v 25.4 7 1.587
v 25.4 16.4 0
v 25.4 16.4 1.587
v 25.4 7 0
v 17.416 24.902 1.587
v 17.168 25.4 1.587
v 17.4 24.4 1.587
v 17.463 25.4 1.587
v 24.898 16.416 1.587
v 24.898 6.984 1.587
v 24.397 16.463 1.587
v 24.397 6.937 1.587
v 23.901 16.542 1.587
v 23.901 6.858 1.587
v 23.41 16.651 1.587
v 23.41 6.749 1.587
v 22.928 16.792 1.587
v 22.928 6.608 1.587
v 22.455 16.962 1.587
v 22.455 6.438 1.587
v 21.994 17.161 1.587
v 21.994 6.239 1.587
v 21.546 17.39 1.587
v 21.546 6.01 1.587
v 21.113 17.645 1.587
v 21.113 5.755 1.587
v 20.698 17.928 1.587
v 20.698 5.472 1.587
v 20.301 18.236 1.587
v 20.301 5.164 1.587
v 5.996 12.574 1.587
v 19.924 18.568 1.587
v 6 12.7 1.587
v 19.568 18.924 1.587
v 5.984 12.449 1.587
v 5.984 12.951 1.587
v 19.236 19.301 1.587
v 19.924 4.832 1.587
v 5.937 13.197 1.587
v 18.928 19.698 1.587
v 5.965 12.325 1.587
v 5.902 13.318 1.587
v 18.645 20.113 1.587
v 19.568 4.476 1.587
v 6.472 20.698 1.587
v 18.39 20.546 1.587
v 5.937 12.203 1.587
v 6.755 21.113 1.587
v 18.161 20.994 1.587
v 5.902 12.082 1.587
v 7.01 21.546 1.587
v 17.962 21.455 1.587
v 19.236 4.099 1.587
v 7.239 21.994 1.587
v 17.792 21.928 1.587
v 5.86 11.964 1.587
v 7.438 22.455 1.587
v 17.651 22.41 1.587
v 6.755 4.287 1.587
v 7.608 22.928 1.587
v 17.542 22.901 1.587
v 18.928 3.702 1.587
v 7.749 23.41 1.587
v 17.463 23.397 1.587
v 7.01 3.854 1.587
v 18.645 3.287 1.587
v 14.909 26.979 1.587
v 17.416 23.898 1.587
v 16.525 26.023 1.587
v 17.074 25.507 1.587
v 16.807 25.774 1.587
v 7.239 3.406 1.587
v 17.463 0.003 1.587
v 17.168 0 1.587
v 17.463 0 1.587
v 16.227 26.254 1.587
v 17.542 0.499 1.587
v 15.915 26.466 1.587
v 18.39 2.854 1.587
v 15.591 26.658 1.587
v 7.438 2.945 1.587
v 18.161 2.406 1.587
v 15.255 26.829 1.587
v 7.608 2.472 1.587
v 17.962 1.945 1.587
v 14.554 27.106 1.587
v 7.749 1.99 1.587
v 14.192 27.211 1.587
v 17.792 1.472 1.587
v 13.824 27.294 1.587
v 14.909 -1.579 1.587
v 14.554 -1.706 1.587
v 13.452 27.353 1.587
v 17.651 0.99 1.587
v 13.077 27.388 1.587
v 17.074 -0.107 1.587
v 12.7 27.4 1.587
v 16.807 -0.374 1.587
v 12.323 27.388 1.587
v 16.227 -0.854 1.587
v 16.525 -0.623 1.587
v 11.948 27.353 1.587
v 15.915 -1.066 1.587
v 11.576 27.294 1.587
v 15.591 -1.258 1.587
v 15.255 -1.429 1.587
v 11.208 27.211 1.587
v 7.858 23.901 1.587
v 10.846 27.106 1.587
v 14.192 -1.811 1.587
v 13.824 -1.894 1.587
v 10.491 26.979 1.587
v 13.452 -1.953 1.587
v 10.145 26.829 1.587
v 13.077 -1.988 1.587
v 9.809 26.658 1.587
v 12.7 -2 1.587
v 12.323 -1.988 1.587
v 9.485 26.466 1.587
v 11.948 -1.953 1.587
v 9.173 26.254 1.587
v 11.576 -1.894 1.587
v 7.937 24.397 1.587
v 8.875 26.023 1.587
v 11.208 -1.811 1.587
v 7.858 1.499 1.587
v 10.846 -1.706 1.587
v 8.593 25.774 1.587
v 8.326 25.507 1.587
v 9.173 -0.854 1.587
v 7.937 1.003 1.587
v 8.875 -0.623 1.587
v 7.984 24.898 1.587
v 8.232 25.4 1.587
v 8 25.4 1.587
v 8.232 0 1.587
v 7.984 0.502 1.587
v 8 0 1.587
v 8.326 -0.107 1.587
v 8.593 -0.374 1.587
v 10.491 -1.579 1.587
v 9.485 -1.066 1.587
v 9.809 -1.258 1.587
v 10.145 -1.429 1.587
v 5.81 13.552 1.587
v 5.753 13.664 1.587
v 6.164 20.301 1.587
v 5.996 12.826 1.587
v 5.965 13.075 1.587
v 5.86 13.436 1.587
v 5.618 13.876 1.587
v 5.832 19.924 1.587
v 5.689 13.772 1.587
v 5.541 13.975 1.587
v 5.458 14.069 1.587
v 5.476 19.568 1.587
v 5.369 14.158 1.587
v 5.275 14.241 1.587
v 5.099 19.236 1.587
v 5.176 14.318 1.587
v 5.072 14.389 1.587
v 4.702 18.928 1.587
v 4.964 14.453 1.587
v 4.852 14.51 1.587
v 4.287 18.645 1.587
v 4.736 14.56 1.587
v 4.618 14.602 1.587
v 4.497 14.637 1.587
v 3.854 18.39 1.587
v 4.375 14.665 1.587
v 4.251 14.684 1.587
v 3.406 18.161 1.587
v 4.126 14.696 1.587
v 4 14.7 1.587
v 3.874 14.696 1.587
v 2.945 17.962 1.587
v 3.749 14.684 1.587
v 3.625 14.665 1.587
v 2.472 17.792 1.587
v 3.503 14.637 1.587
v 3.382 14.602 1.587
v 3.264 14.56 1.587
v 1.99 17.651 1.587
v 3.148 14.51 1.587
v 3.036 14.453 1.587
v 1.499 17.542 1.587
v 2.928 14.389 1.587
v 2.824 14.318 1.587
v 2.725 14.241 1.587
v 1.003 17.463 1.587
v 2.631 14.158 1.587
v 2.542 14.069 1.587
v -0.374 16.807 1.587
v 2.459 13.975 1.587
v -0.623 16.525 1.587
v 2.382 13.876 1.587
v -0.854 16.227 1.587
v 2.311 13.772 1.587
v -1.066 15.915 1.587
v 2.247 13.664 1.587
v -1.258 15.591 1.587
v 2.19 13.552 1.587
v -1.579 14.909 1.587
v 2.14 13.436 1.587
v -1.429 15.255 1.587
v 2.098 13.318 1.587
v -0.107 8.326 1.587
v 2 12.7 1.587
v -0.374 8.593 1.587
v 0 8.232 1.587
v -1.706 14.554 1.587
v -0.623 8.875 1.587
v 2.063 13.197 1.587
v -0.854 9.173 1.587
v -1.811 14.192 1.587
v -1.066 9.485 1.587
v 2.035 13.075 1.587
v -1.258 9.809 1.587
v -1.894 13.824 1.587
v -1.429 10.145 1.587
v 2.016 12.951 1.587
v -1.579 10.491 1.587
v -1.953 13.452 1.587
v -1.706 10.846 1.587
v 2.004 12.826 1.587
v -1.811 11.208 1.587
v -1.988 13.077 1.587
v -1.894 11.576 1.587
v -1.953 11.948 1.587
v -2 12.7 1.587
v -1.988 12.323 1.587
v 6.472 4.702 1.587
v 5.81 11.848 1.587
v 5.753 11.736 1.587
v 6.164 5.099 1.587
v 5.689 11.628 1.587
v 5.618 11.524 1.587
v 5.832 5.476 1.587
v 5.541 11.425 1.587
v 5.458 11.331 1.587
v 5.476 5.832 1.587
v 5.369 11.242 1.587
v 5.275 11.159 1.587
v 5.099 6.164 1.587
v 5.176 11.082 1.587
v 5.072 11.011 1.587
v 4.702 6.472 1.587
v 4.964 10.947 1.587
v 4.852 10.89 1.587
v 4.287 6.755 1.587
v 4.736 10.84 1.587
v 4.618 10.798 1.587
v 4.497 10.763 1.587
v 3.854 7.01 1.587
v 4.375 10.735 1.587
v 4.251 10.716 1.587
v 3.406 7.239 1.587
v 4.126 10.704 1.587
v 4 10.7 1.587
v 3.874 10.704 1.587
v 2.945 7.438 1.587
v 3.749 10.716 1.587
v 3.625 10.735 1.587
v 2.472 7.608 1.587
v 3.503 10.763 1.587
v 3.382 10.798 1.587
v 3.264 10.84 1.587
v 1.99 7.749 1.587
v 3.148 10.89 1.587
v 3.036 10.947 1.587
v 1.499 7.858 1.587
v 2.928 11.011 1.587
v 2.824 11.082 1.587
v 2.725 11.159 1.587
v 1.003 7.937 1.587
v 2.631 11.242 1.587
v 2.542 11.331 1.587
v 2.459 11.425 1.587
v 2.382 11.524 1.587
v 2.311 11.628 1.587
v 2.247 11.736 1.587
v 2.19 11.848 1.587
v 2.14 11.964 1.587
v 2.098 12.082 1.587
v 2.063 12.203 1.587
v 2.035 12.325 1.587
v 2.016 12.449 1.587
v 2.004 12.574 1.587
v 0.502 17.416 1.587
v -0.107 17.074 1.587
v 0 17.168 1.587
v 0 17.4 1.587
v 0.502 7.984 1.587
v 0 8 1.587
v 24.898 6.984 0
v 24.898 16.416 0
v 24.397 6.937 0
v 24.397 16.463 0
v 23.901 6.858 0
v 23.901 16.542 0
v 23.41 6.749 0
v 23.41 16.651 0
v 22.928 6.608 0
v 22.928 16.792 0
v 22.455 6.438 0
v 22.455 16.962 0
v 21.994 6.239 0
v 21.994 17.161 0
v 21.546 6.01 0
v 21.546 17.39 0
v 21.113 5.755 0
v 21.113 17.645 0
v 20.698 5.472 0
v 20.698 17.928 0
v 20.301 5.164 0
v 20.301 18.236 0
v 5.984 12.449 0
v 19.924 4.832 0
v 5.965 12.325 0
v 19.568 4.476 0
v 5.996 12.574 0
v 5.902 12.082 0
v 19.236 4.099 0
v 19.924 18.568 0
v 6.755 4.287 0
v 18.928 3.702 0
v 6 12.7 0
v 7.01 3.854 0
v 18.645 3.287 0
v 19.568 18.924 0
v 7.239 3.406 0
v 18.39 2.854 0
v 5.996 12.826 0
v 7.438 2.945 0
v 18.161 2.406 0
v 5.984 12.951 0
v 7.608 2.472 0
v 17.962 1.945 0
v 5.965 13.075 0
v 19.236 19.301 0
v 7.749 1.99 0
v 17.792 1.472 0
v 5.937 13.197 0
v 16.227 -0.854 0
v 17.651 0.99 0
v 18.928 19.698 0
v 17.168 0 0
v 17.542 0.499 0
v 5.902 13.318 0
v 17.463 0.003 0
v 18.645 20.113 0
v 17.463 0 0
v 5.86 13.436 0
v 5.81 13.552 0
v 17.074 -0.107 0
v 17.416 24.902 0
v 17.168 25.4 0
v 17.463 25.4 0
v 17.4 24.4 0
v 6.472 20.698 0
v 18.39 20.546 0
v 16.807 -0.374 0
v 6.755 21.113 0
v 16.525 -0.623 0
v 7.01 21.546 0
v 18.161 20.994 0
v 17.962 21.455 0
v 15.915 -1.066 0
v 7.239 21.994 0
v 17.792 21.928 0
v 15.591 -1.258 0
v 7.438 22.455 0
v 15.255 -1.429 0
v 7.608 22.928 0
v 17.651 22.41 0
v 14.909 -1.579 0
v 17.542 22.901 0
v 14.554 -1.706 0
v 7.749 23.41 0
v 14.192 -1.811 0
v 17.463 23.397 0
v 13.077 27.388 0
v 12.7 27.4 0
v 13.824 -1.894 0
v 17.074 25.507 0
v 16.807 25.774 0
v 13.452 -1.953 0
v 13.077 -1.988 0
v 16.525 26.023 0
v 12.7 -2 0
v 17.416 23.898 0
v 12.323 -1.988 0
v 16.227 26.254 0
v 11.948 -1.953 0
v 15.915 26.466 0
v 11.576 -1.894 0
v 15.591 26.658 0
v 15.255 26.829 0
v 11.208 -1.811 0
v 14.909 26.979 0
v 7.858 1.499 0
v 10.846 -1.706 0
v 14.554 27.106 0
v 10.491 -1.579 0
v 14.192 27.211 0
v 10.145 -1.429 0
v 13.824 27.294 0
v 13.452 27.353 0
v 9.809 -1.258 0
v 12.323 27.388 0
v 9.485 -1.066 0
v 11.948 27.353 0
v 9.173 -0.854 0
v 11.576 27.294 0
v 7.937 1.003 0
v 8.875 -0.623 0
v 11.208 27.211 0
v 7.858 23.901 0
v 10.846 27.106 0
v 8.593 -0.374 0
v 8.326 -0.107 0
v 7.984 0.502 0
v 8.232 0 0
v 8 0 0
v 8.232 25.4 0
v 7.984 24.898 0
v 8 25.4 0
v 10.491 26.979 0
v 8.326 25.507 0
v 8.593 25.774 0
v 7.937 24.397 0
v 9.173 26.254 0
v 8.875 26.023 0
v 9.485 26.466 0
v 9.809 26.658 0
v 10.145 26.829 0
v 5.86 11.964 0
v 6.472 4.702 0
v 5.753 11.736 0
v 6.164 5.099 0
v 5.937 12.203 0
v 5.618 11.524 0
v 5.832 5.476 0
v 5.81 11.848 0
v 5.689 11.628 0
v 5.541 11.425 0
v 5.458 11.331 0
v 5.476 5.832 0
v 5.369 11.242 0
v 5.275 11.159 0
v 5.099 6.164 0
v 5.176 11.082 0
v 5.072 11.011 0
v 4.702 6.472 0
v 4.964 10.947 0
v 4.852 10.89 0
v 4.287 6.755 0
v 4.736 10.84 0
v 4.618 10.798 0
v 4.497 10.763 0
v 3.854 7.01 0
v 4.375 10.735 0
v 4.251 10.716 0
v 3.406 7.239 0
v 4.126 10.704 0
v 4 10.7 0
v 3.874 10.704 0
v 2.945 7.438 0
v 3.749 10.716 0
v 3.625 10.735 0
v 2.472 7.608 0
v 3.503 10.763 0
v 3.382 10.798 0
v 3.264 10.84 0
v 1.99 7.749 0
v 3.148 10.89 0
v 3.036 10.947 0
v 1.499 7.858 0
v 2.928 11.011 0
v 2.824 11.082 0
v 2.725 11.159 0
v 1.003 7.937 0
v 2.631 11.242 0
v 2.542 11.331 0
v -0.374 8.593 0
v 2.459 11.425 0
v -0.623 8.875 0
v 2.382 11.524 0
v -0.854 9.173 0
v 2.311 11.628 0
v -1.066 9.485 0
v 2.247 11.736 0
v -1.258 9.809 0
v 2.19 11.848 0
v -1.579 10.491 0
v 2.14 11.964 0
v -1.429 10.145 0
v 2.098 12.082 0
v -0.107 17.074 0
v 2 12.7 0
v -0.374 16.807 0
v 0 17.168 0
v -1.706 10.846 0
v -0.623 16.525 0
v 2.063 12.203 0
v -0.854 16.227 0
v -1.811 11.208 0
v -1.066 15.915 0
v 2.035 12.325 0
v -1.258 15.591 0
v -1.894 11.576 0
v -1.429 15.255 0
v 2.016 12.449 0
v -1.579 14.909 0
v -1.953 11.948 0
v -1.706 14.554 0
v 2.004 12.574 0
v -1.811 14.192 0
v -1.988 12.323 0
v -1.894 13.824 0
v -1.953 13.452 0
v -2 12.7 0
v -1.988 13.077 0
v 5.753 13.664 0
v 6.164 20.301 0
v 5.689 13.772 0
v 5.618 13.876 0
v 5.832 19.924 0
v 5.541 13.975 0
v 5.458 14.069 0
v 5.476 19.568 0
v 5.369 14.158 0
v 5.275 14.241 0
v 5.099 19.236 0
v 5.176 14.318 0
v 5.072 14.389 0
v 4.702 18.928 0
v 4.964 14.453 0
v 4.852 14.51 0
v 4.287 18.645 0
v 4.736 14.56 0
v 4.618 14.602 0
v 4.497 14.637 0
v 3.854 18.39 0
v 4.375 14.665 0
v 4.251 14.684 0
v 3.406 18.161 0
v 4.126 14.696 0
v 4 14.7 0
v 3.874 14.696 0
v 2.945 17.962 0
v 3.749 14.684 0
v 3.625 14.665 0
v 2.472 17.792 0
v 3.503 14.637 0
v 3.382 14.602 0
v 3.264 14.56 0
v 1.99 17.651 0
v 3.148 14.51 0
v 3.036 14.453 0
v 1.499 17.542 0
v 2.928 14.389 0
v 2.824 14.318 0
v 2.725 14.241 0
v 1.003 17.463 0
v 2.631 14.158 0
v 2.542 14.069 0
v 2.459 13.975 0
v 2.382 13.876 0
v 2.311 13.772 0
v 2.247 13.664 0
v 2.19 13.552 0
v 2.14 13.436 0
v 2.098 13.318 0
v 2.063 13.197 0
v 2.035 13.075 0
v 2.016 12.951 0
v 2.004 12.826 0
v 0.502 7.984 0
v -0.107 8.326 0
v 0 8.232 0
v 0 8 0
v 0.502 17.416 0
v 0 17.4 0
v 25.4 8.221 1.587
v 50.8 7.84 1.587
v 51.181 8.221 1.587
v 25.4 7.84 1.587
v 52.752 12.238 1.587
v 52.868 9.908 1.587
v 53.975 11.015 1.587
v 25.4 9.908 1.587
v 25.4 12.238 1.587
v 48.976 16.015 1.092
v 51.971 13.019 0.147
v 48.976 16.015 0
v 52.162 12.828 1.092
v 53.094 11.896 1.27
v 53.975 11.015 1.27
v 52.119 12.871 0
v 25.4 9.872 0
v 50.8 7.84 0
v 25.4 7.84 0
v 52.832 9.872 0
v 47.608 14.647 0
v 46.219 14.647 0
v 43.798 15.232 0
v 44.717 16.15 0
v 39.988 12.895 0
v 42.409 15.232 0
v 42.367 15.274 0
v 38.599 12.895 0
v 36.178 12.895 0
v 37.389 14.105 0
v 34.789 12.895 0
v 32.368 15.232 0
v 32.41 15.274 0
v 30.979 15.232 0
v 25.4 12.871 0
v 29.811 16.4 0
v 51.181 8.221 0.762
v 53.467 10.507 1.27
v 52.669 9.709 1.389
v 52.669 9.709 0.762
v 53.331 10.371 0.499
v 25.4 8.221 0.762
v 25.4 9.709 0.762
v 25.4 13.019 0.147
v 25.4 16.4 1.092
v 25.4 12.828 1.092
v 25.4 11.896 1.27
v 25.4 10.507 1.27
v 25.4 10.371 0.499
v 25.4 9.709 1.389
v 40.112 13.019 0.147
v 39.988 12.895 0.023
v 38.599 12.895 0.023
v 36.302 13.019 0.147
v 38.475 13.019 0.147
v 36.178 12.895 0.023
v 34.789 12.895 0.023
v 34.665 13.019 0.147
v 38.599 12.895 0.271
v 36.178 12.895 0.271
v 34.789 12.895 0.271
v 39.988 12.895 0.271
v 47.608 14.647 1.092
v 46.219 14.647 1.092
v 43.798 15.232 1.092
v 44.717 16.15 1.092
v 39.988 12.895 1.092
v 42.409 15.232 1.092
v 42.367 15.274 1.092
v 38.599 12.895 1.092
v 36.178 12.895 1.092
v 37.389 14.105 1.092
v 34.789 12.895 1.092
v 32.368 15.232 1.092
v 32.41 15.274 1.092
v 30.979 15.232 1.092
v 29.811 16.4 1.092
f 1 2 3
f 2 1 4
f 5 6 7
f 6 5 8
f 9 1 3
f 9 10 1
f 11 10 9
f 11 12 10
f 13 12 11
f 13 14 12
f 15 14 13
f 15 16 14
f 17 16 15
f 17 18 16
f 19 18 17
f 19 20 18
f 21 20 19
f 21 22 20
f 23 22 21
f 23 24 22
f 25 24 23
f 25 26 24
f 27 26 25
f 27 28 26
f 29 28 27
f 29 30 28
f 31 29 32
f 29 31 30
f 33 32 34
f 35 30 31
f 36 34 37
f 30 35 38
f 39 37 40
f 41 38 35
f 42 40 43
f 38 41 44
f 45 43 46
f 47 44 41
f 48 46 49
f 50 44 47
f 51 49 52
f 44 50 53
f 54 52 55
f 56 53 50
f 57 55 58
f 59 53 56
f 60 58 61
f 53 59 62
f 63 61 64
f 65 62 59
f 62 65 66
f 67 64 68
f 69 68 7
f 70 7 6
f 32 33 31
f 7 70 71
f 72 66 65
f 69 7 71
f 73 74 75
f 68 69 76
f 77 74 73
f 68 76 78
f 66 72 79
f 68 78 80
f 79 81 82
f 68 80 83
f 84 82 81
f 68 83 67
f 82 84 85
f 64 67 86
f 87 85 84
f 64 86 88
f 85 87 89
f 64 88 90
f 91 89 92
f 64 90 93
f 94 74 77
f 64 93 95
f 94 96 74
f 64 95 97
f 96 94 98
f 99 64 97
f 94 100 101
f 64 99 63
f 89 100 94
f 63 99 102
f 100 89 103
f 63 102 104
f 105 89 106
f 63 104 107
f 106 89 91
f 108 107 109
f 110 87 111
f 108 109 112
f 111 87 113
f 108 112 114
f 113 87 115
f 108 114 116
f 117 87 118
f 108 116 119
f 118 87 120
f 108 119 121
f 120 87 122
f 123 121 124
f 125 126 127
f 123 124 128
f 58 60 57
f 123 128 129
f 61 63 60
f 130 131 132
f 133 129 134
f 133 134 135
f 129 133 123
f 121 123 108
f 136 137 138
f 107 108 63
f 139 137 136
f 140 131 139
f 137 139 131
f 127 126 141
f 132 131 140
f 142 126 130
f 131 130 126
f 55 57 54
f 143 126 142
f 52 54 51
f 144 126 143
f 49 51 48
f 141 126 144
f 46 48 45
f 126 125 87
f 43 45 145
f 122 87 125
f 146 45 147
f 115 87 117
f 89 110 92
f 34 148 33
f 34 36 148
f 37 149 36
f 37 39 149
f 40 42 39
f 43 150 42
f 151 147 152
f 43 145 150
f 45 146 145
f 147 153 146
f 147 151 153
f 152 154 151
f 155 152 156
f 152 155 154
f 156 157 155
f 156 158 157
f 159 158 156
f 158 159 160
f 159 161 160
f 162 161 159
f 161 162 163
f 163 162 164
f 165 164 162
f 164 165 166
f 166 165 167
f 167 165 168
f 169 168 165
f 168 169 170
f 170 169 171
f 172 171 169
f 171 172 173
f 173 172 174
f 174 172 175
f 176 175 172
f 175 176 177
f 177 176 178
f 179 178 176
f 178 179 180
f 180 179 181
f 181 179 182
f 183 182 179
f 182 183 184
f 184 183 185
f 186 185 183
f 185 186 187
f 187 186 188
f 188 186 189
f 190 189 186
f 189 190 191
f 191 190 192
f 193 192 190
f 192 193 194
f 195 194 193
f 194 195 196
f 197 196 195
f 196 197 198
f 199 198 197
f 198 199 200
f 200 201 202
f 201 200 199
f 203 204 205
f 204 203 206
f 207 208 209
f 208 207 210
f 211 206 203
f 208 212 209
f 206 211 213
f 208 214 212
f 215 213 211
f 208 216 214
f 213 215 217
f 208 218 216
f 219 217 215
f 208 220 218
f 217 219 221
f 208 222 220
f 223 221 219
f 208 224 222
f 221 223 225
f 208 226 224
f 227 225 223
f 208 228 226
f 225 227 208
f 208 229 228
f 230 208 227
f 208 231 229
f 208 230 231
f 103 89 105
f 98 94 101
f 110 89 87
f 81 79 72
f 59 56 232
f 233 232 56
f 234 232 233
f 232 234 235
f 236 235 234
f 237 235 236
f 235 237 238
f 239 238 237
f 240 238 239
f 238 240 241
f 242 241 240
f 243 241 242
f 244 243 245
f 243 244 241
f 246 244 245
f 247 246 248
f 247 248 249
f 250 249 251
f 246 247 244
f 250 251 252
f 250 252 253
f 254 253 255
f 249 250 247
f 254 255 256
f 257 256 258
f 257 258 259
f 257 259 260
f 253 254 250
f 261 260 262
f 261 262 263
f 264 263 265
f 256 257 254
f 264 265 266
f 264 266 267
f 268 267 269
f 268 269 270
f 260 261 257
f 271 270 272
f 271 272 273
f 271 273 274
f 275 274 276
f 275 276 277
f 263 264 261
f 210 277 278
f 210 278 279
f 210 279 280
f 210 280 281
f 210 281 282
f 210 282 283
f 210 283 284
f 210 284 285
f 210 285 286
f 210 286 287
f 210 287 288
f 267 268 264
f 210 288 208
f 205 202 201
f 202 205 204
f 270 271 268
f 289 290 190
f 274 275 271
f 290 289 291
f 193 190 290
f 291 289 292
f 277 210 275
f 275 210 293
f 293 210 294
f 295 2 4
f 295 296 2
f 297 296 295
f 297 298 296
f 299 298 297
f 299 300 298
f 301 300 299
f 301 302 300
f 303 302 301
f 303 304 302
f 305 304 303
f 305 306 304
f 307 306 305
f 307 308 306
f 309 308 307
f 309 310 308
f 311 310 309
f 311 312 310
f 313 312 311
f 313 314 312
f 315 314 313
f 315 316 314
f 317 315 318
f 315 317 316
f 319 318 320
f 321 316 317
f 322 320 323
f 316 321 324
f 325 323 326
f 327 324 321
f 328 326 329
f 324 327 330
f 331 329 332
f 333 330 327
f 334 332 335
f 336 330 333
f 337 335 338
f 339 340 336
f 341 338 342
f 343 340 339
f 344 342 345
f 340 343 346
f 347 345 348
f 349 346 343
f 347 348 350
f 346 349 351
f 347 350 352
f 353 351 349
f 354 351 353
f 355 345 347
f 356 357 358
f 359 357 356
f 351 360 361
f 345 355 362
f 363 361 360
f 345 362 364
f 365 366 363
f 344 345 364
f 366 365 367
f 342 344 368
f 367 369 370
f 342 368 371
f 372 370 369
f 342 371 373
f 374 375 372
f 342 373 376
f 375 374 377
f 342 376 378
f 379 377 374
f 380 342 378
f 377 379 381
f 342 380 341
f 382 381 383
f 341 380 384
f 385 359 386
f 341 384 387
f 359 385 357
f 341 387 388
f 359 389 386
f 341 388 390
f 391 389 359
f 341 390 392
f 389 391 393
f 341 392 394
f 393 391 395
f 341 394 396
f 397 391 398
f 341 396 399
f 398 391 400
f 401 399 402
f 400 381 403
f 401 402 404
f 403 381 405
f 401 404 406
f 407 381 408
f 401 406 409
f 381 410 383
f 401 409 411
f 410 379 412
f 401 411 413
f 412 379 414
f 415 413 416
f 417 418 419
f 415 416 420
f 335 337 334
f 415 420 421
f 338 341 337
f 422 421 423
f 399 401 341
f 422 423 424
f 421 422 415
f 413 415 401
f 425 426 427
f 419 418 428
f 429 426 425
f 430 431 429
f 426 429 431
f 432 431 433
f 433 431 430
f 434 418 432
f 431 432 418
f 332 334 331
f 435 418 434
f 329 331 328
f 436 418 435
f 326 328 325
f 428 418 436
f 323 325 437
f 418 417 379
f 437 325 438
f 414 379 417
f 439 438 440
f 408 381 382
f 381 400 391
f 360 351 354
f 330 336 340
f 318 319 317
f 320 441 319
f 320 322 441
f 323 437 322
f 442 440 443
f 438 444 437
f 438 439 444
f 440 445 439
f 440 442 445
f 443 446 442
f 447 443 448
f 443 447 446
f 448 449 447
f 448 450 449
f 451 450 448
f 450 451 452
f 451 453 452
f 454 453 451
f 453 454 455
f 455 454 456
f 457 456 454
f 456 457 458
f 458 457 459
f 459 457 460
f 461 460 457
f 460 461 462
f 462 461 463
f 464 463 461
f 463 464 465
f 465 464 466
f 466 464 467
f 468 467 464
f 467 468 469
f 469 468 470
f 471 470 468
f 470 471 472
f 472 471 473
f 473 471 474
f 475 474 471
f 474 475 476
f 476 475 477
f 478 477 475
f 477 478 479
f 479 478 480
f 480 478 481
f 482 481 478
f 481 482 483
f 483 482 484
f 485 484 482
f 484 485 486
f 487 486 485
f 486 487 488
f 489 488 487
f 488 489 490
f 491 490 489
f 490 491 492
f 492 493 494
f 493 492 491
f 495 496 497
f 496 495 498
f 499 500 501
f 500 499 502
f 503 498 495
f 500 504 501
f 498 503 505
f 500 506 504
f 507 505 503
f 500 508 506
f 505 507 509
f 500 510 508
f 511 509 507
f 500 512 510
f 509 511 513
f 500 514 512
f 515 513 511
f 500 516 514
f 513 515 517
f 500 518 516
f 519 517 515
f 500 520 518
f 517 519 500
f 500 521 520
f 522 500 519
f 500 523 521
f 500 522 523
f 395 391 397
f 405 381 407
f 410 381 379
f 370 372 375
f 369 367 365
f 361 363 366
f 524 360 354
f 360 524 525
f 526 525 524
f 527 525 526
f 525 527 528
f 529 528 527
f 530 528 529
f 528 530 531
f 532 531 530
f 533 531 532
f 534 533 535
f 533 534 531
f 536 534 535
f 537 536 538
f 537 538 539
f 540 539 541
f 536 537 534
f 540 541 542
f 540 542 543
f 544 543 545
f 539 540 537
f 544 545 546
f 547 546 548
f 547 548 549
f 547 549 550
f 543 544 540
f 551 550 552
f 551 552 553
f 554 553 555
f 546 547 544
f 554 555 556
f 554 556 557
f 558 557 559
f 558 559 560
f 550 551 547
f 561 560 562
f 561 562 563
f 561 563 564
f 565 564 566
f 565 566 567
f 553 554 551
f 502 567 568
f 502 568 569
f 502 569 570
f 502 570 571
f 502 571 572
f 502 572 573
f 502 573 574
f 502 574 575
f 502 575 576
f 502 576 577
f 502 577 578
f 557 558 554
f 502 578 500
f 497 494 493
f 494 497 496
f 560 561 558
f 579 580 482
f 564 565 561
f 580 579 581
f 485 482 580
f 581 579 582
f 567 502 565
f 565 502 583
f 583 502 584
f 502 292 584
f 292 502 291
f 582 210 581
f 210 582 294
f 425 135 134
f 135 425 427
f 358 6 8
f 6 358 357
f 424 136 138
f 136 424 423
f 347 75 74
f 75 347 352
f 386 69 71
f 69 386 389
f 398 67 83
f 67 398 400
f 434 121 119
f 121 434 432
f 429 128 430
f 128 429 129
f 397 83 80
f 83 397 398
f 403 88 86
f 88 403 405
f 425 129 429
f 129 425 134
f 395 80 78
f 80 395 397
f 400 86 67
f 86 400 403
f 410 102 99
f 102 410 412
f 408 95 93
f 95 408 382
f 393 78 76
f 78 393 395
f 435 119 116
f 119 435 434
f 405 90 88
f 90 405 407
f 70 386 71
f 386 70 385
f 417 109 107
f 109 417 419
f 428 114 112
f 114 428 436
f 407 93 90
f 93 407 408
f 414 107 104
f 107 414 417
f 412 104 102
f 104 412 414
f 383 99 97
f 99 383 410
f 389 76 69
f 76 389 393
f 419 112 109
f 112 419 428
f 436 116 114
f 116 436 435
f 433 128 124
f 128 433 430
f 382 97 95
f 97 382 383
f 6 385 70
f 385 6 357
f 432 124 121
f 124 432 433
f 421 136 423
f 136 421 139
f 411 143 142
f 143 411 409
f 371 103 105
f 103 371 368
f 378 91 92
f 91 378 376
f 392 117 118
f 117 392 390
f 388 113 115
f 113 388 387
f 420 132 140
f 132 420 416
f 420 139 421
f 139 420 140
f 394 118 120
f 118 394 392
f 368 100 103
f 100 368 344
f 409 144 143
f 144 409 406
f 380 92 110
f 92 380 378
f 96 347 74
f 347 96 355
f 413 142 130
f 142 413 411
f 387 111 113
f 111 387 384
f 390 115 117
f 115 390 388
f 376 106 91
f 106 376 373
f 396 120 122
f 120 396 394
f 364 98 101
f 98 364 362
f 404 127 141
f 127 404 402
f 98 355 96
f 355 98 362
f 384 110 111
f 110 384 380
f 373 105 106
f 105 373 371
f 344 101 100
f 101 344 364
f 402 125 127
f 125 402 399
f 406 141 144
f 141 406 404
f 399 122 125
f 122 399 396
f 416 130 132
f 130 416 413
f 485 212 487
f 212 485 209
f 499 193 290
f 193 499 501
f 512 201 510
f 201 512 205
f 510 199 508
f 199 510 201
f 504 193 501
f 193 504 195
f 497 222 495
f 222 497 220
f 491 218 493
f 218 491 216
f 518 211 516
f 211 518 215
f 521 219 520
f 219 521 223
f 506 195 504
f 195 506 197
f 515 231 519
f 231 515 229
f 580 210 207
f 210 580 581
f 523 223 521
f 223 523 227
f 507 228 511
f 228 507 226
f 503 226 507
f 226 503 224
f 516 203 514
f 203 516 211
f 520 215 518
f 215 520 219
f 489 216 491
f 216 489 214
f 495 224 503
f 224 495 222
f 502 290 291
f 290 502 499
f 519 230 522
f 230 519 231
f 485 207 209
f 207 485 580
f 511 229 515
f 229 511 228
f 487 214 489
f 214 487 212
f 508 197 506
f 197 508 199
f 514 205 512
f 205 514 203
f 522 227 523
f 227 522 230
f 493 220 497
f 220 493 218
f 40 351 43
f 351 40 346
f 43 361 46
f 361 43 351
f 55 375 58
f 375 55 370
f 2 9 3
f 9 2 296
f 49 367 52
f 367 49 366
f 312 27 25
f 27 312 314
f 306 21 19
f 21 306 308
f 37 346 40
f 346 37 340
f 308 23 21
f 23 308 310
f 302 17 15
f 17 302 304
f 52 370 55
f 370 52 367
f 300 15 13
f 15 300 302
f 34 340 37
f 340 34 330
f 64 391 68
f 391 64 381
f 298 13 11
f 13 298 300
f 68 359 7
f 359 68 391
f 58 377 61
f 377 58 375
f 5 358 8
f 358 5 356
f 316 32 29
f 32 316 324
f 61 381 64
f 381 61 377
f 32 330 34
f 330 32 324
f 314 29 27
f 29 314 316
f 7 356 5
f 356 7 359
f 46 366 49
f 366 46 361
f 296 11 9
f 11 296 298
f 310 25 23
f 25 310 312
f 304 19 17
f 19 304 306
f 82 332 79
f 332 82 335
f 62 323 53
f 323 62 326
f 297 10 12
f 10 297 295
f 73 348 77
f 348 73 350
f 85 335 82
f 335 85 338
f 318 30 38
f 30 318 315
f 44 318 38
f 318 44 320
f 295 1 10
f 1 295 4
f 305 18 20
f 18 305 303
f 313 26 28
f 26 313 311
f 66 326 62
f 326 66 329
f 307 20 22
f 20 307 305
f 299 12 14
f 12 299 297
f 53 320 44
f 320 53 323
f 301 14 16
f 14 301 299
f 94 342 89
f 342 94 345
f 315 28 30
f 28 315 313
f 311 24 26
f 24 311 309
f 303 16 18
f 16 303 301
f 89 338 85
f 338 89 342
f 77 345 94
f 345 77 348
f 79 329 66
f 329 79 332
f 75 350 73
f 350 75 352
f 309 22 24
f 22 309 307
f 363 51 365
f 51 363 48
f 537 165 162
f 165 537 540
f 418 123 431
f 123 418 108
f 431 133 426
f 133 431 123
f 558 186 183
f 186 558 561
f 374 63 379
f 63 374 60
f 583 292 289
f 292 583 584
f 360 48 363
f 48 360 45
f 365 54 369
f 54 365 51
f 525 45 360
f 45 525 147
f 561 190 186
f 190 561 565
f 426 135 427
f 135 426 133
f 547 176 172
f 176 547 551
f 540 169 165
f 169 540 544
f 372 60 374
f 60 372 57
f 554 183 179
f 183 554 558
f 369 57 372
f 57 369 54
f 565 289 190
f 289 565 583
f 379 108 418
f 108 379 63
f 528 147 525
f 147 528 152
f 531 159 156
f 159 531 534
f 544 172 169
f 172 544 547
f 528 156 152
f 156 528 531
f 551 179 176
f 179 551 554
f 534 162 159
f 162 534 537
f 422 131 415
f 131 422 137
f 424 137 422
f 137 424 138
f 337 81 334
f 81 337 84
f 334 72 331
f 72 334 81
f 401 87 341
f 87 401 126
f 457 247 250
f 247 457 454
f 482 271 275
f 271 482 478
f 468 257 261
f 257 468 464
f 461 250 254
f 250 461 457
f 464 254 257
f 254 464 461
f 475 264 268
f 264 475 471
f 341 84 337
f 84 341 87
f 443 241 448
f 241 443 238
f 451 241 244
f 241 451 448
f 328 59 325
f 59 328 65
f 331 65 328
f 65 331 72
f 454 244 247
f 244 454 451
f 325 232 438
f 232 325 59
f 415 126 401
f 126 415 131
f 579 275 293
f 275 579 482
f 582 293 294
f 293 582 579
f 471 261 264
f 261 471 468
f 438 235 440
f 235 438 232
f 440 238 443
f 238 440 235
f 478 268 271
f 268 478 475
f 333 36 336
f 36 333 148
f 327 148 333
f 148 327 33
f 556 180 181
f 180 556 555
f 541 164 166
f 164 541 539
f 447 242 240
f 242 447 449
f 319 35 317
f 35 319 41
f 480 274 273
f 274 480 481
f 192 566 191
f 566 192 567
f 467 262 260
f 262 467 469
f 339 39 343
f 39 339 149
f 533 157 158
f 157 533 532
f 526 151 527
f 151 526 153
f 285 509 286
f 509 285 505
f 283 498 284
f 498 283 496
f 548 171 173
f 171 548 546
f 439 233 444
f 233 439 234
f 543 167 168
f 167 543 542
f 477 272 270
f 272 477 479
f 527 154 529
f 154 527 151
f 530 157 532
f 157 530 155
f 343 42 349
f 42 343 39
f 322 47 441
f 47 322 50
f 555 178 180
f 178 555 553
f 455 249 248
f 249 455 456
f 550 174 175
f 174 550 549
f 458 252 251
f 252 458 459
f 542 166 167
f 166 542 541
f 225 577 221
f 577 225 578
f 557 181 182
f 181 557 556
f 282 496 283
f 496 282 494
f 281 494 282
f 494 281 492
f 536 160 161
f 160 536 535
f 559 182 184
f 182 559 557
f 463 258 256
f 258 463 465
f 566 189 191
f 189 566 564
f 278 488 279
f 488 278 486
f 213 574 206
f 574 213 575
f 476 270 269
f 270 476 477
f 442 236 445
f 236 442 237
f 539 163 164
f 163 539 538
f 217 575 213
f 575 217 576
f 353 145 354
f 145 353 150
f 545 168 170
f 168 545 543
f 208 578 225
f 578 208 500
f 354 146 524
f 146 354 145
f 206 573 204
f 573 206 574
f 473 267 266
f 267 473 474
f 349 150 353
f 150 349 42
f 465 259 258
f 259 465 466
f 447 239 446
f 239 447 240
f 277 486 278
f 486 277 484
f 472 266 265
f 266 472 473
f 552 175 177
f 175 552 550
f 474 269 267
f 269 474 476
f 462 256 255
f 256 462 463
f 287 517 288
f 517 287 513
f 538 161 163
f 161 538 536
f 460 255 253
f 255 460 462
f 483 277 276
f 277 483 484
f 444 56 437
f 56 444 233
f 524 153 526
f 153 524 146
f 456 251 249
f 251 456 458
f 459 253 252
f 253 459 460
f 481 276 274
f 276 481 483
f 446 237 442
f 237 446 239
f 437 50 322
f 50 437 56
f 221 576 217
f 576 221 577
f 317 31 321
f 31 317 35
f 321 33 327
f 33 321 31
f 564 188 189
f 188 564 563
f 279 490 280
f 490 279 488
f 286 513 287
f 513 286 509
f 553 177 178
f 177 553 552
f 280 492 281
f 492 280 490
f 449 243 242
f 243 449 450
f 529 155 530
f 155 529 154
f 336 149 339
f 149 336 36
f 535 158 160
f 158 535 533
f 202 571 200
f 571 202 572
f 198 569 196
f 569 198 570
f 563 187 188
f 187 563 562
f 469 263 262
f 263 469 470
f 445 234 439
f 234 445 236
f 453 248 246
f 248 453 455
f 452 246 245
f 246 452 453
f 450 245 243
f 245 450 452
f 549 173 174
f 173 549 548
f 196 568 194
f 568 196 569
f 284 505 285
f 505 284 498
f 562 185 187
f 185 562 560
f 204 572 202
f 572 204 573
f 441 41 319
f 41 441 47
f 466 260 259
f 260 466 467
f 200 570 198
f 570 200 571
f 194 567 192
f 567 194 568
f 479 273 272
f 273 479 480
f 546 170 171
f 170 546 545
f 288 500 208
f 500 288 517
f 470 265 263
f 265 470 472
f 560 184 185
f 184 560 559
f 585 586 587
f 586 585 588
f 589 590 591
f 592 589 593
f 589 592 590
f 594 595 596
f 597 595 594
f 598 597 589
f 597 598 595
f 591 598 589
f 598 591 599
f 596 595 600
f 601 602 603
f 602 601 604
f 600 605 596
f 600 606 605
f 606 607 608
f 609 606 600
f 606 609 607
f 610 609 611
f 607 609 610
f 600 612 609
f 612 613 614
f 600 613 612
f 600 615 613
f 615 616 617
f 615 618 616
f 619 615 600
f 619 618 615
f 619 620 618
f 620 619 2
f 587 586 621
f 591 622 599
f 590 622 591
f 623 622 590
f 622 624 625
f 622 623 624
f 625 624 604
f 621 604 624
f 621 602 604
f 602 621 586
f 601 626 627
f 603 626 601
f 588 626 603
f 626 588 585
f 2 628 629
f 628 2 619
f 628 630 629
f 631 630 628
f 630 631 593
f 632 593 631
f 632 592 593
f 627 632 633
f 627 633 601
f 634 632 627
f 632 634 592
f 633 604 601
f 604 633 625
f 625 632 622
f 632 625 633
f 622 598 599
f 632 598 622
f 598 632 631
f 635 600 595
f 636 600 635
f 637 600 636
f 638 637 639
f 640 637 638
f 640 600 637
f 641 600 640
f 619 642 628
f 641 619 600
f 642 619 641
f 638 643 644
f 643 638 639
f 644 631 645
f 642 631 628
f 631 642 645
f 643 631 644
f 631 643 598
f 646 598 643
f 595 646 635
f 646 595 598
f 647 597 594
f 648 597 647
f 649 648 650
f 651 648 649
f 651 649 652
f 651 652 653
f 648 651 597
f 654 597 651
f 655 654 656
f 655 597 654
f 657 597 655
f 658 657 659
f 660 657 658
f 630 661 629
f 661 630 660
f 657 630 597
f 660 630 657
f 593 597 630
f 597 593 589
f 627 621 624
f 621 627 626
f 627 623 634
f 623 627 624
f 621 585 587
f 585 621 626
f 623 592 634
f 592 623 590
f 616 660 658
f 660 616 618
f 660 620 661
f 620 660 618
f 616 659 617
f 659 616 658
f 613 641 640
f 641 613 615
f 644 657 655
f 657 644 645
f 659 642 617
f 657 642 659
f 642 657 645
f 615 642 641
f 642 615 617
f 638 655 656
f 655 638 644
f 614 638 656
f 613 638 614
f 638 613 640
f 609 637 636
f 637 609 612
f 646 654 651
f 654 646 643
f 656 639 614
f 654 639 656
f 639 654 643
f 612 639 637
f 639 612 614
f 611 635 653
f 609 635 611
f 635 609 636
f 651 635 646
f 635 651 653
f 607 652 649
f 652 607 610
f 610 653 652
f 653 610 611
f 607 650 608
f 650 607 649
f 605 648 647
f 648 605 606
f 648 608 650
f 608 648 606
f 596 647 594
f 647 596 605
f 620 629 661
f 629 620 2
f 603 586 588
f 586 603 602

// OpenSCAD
// github.com/ewust/keys
// but done by baburgess looks like

$fn=100;

function mm(i) = i*25.4;

module bow(bow_length, bow_width, bow_thickness)
{
	difference()
		{
				union()
						{
									cube([bow_length, bow_width, bow_thickness]);

											  	     //Place cylinders on the top and bottom of the bow for style

												     	     	       //Top middle
																	translate([bow_length / 2, bow_width - 4, 0]) cylinder(h = bow_thickness, r = 6);

																			      	//Bottom middle
																							translate([bow_length / 2, 4, 0]) cylinder(h = bow_thickness, r = 6);

																									      	//Left
																													translate([4, bow_width / 2, 0]) cylinder(h = bow_thickness, r = 6);
																														      		}

																																	//Place cylinders around the edges to create a more contoured design

																																		//Right top
																																				translate([bow_length, bow_width - 1, 0]) cylinder(h = bow_thickness, r = 8);

																																						       //Right bottom
																																								//Positioned -1 from the axis to create a bow stop
																																									     	translate([bow_length, -1 , 0]) cylinder(h = bow_thickness, r = 8);

																																												       //Left top
																																														translate([0, bow_width, 0]) cylinder(h = bow_thickness, r = 8);

																																															      //Left bottom
																																																	translate([0, 0, 0]) cylinder(h = bow_thickness, r = 8);

																																																		      //Place hole for keychain use
																																																		      	      	   translate([4, bow_width / 2, 0]) cylinder(h = bow_thickness, r = 2);
																																																				   		 }
																																																						 }

module bit()
{
	w = mm(1/4);
	  difference()
		{
				translate([-w/2, 0, 0]) cube([w, mm(1), w]);
						    translate([-mm(7/256), 0, 0]) rotate([0, 0, 135]) cube([w, w, w]);
						    			      translate([mm(7/256), 0, 0]) rotate([0, 0, -45]) cube([w, w, w]);
									      			    }
												    }

module blade(blade_length, blade_width, blade_thickness, key_cuts, shoulder, cut_spacing, cut_depth)
{
	difference()
		{
				cube([blade_length, blade_width, blade_thickness]);

						    //Contour tip
								translate([blade_length, mm(1/8), 0])
											 	  {
															rotate([0, 0, 45]) cube([10, 10, blade_thickness]);
																      	   rotate([0, 0, 225]) cube([10, 10, blade_thickness]);
																	   	      	 }

																				//Cut the key channels
																				      	  union()
																							{
																										translate([0, mm(.105), mm(.025)]) rotate([225, 0, 0]) cube([blade_length, blade_width, blade_width]);
																											      			   translate([0, mm(.105), mm(.05)]) rotate([260, 0, 0]) cube([blade_length, blade_thickness / 2, mm(1/32)]);
																														   		 	   	     translate([0, mm(.105), 0]) cube([blade_length, mm(7/128), mm(.05)]);
																																		     		   	     	 translate([0, mm(.105) + mm(7/128), mm(.05)]) rotate([225, 0, 0]) cube([blade_length, mm(3/64), blade_thickness]);
																																						 	       		}

																																										translate([0, blade_width - mm(9/64), mm(.043)])
																																											      		  {
																																																cube([blade_length, mm(10/64), blade_thickness]);
																																																				rotate([50, 0, 0]) cube([blade_length, blade_width, blade_thickness]);
																																																					       }

																																																						union() {
																																																									translate([0, mm(0.015), mm(.03)]) cube([blade_length, mm(15/256), blade_thickness]);
																																																										      		 	   translate([0, mm(0.015) + mm(13/256), blade_thickness - mm(1/64)]) rotate([45, 0, 0]) cube([blade_length, mm(1/16), mm(1/16)]);
																																																													   		 	   }

																																																																	//Cut the blade
																																																																	      	  for (counter = [0:4])
																																																																		      	       {
																																																																						translate([shoulder + (counter * cut_spacing), blade_width - (key_cuts[counter]) * cut_depth, 0]) bit();
																																																																								      }
																																																																									}
																																																																									}

module kw1(key_cuts)
{
	blade_length = mm(9/8);
		     blade_width = mm(.337);
		     		 blade_thickness = mm(0.080);

				 shoulder = mm(0.247);
				 	  cut_spacing = mm(.15);
					  	      cut_depth = mm(.023);

						      bow_length = mm(1);
						      		 bow_width = mm(1);
								 	   bow_thickness = mm(1/16);

									   union()
										{
												bow(bow_length, bow_width, bow_thickness);
															   translate([bow_length, bow_width - blade_width - 9, 0]) blade(blade_length, blade_width, bow_thickness, key_cuts, shoulder, cut_spacing, cut_depth);
															   			  }
																		  }

kw1([2, 6, 6, 2, 3]);
